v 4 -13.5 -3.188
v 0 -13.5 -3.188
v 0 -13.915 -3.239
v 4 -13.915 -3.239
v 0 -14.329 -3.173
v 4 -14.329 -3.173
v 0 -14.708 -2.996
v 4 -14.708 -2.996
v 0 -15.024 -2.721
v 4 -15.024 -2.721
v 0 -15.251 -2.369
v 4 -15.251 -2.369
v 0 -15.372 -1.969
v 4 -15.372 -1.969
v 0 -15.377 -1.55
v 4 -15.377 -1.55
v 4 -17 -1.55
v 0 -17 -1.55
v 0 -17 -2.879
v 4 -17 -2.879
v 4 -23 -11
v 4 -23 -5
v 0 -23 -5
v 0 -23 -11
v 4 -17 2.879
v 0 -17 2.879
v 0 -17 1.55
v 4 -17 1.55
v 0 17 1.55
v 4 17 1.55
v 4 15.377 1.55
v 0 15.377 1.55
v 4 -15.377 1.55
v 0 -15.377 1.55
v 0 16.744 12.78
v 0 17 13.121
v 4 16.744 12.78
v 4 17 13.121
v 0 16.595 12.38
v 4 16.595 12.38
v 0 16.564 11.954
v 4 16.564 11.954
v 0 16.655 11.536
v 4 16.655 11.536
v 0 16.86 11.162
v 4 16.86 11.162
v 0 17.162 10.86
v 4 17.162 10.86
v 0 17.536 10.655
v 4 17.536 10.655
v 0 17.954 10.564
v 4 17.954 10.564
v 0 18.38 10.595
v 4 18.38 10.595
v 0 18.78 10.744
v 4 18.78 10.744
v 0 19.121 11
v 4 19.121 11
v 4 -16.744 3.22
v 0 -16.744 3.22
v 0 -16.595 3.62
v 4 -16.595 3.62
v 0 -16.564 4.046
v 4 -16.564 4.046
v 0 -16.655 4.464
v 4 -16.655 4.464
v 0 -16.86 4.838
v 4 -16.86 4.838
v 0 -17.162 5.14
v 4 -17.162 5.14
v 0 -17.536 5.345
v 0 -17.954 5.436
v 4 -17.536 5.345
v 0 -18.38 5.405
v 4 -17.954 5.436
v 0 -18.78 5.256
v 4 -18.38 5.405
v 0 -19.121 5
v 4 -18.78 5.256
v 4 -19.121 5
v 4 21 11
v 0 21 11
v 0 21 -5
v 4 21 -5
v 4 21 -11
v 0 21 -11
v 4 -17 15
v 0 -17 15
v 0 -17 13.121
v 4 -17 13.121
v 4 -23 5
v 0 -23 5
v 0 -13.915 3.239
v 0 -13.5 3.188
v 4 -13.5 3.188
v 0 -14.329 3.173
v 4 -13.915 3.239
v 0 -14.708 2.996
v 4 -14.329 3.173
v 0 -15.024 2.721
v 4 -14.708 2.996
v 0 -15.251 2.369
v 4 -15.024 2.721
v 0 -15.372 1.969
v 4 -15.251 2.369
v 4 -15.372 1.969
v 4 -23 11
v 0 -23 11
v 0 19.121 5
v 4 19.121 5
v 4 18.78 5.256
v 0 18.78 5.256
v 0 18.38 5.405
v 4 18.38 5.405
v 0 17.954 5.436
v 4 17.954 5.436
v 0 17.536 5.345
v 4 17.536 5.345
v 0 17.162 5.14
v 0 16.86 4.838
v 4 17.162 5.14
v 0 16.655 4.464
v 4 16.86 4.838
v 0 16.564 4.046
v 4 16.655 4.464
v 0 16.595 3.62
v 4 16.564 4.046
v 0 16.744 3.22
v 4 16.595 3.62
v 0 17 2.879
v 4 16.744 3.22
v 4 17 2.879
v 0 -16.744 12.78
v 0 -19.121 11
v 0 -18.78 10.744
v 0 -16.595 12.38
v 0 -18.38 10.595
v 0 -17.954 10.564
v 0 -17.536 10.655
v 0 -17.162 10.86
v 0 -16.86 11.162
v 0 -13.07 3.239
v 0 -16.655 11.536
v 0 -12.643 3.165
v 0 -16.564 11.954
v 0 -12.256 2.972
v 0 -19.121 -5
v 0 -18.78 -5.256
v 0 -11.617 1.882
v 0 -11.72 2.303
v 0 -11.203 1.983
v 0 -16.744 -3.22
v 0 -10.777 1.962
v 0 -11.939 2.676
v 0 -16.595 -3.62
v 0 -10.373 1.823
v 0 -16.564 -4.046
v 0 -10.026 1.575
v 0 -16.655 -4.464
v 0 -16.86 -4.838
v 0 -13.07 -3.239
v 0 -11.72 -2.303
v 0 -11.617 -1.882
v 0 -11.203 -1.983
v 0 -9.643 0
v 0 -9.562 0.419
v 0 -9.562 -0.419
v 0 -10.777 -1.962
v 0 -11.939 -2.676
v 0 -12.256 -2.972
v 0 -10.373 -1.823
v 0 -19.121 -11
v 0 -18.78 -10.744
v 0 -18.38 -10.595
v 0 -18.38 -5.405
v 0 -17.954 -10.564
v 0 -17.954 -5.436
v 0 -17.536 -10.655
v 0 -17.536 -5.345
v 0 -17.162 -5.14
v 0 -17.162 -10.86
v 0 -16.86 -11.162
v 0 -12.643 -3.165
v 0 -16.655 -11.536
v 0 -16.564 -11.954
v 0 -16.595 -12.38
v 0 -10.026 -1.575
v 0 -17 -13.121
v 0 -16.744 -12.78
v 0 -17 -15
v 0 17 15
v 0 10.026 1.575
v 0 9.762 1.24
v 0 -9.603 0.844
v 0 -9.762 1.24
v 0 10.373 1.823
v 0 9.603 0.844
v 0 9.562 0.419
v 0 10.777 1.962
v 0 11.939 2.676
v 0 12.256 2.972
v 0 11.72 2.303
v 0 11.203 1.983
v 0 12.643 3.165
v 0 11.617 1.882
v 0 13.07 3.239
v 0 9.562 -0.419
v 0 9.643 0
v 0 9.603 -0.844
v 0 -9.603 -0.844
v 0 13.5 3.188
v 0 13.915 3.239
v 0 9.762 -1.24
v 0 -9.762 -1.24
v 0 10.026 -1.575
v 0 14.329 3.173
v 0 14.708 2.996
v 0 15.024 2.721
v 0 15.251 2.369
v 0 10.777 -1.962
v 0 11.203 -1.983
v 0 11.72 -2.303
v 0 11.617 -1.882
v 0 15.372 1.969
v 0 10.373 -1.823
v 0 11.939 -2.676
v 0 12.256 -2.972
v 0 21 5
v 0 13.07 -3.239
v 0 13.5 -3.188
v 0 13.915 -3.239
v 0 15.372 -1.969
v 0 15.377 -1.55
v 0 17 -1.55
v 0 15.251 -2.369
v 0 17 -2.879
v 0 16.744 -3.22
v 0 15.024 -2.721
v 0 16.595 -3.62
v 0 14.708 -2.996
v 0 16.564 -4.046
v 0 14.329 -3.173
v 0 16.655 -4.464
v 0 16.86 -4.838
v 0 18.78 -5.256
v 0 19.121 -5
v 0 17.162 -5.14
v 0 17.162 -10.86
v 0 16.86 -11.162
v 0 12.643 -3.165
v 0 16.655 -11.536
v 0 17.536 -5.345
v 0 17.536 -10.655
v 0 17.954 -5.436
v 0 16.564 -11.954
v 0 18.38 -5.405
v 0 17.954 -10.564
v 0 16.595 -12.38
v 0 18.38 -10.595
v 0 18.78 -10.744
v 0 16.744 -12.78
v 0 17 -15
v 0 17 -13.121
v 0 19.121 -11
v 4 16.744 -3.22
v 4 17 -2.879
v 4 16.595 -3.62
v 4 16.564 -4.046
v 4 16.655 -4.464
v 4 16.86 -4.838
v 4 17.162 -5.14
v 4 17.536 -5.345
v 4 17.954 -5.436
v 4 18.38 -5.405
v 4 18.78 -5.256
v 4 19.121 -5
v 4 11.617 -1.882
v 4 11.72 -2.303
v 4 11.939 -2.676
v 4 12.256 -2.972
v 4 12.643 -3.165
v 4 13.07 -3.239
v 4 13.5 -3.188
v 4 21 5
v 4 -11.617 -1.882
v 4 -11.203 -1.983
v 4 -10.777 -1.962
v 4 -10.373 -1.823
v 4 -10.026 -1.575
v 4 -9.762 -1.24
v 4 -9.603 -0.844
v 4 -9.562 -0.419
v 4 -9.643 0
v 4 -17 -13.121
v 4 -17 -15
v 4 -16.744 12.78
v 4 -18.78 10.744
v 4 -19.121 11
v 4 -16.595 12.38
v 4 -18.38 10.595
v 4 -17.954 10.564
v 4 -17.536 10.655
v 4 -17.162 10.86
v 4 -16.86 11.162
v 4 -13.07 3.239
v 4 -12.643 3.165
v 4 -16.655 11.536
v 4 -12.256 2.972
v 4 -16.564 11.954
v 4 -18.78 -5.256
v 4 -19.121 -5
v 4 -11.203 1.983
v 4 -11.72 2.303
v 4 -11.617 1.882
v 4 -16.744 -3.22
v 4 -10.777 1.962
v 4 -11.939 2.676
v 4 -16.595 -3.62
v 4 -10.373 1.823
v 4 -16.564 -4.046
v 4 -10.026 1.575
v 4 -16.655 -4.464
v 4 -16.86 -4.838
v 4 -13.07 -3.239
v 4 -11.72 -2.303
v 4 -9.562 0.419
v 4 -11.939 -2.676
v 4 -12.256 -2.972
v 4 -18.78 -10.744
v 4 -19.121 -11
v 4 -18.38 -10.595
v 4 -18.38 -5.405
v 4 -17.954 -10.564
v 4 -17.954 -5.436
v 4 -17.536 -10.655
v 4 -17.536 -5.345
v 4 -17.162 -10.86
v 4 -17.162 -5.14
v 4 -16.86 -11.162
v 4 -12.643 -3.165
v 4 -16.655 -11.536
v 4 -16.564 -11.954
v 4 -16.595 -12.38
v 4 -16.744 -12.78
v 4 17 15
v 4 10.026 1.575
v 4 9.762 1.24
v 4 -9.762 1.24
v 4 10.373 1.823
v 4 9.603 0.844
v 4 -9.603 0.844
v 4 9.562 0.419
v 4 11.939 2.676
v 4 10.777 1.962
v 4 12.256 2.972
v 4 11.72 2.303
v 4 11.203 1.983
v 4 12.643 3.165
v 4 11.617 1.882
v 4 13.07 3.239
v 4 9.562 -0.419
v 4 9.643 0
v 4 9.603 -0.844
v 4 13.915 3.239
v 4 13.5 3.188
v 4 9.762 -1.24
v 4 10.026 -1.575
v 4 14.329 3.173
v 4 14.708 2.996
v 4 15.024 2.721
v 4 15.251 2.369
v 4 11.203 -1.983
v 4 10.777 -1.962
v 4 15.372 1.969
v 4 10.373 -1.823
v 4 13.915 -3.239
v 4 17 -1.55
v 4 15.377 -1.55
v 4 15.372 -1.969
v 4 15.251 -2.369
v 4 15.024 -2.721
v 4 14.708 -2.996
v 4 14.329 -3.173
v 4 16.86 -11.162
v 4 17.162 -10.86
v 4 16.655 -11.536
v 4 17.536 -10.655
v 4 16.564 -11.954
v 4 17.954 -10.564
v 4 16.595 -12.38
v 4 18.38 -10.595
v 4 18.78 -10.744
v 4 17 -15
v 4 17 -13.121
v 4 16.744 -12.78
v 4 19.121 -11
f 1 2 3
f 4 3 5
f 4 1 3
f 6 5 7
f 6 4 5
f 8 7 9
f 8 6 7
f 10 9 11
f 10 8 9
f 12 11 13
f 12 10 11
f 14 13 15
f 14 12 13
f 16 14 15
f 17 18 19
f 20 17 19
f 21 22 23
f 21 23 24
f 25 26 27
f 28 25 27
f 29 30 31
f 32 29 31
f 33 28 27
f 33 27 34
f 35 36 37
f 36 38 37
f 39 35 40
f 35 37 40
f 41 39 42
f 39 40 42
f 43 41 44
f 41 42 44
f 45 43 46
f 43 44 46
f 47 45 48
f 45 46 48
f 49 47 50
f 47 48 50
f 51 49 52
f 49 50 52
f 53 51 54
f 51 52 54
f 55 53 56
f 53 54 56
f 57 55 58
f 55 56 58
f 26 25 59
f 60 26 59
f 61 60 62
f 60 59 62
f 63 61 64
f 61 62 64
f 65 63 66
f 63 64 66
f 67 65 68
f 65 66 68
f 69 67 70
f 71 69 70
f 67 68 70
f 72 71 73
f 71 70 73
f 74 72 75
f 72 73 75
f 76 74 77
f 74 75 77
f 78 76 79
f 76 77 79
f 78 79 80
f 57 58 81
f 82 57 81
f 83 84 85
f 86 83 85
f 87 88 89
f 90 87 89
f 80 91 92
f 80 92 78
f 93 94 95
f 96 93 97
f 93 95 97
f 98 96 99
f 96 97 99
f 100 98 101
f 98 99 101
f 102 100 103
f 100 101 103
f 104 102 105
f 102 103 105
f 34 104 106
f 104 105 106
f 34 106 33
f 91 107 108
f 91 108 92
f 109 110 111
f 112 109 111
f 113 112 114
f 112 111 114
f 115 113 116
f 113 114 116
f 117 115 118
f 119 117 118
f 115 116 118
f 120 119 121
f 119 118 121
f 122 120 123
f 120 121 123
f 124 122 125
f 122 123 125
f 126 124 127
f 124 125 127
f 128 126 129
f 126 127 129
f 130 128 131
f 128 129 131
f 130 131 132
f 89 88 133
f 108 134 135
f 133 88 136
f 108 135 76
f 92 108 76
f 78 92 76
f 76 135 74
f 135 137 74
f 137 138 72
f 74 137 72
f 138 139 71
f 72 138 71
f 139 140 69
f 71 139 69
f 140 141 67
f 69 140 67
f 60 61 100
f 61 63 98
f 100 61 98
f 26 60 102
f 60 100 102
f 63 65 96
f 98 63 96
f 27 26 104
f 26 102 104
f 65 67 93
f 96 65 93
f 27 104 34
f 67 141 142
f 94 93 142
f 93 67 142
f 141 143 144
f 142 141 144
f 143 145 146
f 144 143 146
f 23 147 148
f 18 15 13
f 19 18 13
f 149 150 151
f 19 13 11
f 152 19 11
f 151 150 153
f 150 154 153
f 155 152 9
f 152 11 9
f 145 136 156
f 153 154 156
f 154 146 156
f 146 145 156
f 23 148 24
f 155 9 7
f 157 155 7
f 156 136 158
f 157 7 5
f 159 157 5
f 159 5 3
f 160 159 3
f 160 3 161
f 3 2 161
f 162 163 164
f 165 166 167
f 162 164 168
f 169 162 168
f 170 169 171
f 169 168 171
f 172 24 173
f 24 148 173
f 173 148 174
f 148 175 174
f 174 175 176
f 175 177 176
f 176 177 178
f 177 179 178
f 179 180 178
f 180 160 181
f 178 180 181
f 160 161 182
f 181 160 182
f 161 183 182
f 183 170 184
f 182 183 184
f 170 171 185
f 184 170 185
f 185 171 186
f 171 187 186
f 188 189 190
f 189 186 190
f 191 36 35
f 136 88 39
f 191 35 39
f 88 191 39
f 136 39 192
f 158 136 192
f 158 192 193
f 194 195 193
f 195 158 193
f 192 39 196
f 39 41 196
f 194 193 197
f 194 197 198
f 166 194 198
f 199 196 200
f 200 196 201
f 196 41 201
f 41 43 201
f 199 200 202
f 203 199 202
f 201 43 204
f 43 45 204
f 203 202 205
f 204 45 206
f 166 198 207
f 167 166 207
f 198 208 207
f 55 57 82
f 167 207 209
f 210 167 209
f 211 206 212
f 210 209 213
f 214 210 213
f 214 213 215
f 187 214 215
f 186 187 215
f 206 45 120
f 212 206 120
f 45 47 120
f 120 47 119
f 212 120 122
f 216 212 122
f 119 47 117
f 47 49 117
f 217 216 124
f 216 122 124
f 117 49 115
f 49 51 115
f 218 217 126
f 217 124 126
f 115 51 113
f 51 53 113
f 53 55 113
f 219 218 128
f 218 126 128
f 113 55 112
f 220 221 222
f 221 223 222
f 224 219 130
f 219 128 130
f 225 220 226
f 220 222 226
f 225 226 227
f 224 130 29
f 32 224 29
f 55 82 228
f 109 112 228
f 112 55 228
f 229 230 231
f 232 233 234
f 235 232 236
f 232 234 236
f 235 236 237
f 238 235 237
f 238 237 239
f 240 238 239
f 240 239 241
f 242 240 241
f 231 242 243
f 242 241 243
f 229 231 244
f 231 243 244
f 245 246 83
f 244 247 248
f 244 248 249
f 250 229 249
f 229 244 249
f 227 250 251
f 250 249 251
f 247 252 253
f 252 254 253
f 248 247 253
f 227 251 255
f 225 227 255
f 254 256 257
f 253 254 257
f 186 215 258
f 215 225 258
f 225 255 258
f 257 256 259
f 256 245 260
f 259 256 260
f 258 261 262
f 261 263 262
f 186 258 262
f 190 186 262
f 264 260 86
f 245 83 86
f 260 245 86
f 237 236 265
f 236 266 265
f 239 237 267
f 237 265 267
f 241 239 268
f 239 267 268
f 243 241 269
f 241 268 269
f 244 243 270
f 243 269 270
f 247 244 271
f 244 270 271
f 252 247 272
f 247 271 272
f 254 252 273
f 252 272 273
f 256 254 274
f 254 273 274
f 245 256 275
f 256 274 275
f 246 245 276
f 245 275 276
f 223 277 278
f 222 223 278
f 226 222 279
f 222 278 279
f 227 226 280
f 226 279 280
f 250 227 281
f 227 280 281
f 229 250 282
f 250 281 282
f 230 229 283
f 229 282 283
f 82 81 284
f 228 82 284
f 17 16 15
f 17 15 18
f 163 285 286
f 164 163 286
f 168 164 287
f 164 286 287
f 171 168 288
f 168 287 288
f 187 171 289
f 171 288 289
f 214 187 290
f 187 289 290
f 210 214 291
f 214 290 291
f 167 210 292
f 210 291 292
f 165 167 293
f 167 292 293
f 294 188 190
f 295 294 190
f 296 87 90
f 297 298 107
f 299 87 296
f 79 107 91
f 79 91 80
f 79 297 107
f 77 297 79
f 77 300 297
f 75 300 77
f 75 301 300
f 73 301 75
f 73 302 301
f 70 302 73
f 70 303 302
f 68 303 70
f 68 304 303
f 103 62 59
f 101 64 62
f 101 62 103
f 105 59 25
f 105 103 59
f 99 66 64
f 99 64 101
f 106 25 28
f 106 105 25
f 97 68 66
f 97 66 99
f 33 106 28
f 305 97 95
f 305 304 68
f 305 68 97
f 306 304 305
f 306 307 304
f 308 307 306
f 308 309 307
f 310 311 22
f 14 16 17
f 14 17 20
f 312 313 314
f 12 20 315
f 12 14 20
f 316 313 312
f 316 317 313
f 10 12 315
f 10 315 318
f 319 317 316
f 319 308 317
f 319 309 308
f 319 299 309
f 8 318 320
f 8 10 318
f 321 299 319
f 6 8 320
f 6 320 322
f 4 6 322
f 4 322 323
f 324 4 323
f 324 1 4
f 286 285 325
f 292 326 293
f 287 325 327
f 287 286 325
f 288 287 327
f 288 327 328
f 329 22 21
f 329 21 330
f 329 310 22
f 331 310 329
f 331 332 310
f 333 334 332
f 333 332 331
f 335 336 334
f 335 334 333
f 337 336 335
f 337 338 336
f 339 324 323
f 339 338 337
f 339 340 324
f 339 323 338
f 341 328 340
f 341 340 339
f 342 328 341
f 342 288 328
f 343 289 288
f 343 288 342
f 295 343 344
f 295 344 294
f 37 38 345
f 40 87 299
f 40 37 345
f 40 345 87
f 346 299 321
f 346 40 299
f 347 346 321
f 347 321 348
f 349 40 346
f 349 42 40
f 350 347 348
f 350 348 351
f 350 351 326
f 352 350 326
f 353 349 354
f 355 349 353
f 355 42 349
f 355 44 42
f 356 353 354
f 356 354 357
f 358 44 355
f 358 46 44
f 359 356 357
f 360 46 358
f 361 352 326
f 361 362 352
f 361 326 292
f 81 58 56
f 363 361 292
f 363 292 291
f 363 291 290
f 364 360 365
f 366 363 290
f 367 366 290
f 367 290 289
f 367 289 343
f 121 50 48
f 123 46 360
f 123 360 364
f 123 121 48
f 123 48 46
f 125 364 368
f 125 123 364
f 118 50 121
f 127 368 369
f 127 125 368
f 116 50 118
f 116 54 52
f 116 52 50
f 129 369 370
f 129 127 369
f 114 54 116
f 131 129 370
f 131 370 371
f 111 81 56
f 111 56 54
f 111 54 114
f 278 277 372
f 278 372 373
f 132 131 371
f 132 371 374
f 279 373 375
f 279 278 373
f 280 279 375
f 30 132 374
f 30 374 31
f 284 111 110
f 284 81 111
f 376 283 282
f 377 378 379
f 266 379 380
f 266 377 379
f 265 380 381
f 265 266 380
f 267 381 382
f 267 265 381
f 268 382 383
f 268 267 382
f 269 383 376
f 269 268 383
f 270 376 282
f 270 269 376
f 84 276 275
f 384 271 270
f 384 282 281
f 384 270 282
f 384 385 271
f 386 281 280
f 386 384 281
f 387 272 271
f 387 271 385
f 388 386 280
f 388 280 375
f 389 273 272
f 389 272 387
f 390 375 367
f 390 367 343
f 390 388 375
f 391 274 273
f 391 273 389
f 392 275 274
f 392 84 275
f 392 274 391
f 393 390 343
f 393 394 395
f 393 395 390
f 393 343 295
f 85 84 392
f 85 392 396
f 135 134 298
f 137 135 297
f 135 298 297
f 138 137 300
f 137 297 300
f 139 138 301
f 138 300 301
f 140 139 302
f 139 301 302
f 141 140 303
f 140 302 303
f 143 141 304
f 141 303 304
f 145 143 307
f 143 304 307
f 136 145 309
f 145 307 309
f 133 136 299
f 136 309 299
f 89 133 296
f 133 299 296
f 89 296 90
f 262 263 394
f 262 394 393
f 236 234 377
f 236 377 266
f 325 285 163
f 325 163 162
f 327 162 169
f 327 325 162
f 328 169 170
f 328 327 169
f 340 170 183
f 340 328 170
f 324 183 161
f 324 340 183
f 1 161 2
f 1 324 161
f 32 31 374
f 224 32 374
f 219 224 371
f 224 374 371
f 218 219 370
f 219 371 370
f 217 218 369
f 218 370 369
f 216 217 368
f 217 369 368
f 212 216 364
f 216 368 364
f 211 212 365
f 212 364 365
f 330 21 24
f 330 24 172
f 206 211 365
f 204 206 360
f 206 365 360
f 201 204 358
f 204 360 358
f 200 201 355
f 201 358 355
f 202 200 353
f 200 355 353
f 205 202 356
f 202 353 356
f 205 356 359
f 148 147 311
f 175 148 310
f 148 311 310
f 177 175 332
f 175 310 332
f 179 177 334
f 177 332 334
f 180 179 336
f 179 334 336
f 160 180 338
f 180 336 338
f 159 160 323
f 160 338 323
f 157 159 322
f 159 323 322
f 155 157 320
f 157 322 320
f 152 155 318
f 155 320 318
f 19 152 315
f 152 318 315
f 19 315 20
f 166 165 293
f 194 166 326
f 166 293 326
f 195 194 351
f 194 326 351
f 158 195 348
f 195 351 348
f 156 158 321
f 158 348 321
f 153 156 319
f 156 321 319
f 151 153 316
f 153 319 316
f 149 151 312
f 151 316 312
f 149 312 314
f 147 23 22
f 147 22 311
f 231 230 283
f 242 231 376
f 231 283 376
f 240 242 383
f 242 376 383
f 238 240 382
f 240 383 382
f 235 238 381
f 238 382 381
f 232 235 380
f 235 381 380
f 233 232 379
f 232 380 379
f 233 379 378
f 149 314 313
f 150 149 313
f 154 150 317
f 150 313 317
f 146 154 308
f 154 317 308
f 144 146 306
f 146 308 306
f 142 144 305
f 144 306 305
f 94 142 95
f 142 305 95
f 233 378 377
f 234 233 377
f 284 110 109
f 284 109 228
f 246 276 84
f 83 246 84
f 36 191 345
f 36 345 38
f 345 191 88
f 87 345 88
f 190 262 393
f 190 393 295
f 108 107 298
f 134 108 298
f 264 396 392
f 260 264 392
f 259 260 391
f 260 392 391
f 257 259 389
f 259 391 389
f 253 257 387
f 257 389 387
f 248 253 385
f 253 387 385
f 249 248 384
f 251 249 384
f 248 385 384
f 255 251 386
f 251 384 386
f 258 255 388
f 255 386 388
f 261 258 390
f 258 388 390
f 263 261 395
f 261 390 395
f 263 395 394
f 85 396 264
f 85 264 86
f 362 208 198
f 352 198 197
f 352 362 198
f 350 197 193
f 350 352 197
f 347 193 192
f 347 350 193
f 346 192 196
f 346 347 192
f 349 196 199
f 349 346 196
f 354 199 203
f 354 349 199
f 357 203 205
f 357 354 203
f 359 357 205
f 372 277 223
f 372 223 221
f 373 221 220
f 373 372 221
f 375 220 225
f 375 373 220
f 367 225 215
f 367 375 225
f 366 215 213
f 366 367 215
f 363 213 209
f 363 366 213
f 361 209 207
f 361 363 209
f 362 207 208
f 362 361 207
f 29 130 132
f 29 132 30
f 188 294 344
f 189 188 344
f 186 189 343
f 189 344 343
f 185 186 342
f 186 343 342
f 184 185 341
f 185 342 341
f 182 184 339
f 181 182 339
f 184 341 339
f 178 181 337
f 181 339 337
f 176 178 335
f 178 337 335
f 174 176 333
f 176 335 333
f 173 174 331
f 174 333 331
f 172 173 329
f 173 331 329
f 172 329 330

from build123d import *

# Parameters (mm, degrees)
CROQUIS1_W              = 34
CROQUIS1_H              = 30
SALIENTE_EXTRUIR1_DEPTH = 4
CROQUIS2_W              = 6
CROQUIS2_H              = 4
SALIENTE_EXTRUIR2_DEPTH = 4
CORTAR_EXTRUIR1_DEPTH   = 5
CROQUIS4_W              = 6
CROQUIS4_H              = 2
SALIENTE_EXTRUIR3_DEPTH = 4
CROQUIS5_R              = 1.5
CORTAR_EXTRUIR2_DEPTH   = 5
CORTAR_EXTRUIR4_DEPTH   = 5
CORTAR_EXTRUIR6_DEPTH   = 5


with BuildPart() as part:
    # Croquis1 → Saliente-Extruir1 (new body)
    with BuildSketch(Plane(origin=(0, 0, 0), x_dir=(0, -1, 0), z_dir=(1, 0, 0))):
        Rectangle(CROQUIS1_W, CROQUIS1_H)
    extrude(amount=SALIENTE_EXTRUIR1_DEPTH)

    # Croquis2 → Saliente-Extruir2 (add, through all)
    with BuildSketch(Plane(origin=(4, 0, 0), x_dir=(0, 0, -1), z_dir=(1, 0, 0))):
        with Locations((-8, -19)):
            Rectangle(CROQUIS2_W, CROQUIS2_H)
        with Locations((8, -19)):
            Rectangle(CROQUIS2_W, CROQUIS2_H)
        with Locations((8, 19)):
            Rectangle(CROQUIS2_W, CROQUIS2_H)
        with Locations((-8, 19)):
            Rectangle(CROQUIS2_W, CROQUIS2_H)
    extrude(amount=-SALIENTE_EXTRUIR2_DEPTH)

    # Croquis3 → Cortar-Extruir1 (cut, through all)
    with BuildSketch(Plane(origin=(4, 0, 0), x_dir=(0, 0, -1), z_dir=(1, 0, 0))):
        Polygon((-1.55, 17), (-1.55, 14.95), (-2.8, 14.95), (-2.8, 12.05), (-1.55, 12.05), (-1.55, 10), (1.55, 10), (1.55, 12.05), (2.8, 12.05), (2.8, 14.95), (1.55, 14.95), (1.55, 17), align=None)
        Polygon((1.55, -12.05), (2.8, -12.05), (2.8, -14.95), (1.55, -14.95), (1.55, -17), (-1.55, -17), (-1.55, -14.95), (-2.8, -14.95), (-2.8, -12.05), (-1.55, -12.05), (-1.55, -10), (1.55, -10), align=None)
    extrude(amount=-CORTAR_EXTRUIR1_DEPTH, mode=Mode.SUBTRACT)

    # Croquis4 → Saliente-Extruir3 (add, through all)
    with BuildSketch(Plane(origin=(4, 0, 0), x_dir=(0, 0, -1), z_dir=(1, 0, 0))):
        with Locations((-8, -22)):
            Rectangle(CROQUIS4_W, CROQUIS4_H)
        with Locations((8, -22)):
            Rectangle(CROQUIS4_W, CROQUIS4_H)
    extrude(amount=-SALIENTE_EXTRUIR3_DEPTH)

    # Croquis5 → Cortar-Extruir2 (cut, through all)
    with BuildSketch(Plane(origin=(4, 0, 0), x_dir=(0, 0, -1), z_dir=(1, 0, 0))):
        with Locations((-12.060660172, -18.060660172)):
            Circle(CROQUIS5_R)
        with Locations((-3.939339828, -18.060660172)):
            Circle(CROQUIS5_R)
        with Locations((12.060660172, -18.060660172)):
            Circle(CROQUIS5_R)
        with Locations((3.939339828, -18.060660172)):
            Circle(CROQUIS5_R)
        with Locations((-12.060660172, 18.060660172)):
            Circle(CROQUIS5_R)
        with Locations((-3.939339828, 18.060660172)):
            Circle(CROQUIS5_R)
        with Locations((3.939339828, 18.060660172)):
            Circle(CROQUIS5_R)
        with Locations((12.060660172, 18.060660172)):
            Circle(CROQUIS5_R)
    extrude(amount=-CORTAR_EXTRUIR2_DEPTH, mode=Mode.SUBTRACT)

    # Croquis6 → Cortar-Extruir4 (cut, through all)
    with BuildSketch(Plane(origin=(4, 0, 0), x_dir=(0, 0, -1), z_dir=(1, 0, 0))):
        with BuildLine():
            ThreePointArc((0, -9.64272275), (-1.989339828, -11.060660172), (0, -12.478597594))
            ThreePointArc((0, -12.478597594), (1.989339828, -11.060660172), (0, -9.64272275))
        make_face()
        with BuildLine():
            ThreePointArc((0, 9.64272275), (-1.989339828, 11.060660172), (0, 12.478597594))
            ThreePointArc((0, 12.478597594), (1.989339828, 11.060660172), (0, 9.64272275))
        make_face()
    extrude(amount=-CORTAR_EXTRUIR4_DEPTH, mode=Mode.SUBTRACT)

    # Croquis7 → Cortar-Extruir6 (cut, through all)
    with BuildSketch(Plane(origin=(4, 0, 0), x_dir=(0, 0, -1), z_dir=(1, 0, 0))):
        with BuildLine():
            ThreePointArc((-0.290749307, -13.5), (-1.739339828, -11.610660172), (-3.187930349, -13.5))
            ThreePointArc((-3.187930349, -13.5), (-1.739339828, -15.389339828), (-0.290749307, -13.5))
        make_face()
        with BuildLine():
            ThreePointArc((0.290749307, -13.5), (1.739339828, -11.610660172), (3.187930349, -13.5))
            ThreePointArc((3.187930349, -13.5), (1.739339828, -15.389339828), (0.290749307, -13.5))
        make_face()
        with BuildLine():
            ThreePointArc((0.290749307, 13.5), (1.739339828, 11.610660172), (3.187930349, 13.5))
            ThreePointArc((3.187930349, 13.5), (1.739339828, 15.389339828), (0.290749307, 13.5))
        make_face()
        with BuildLine():
            ThreePointArc((-0.290749307, 13.5), (-1.739339828, 15.389339828), (-3.187930349, 13.5))
            ThreePointArc((-3.187930349, 13.5), (-1.739339828, 11.610660172), (-0.290749307, 13.5))
        make_face()
    extrude(amount=-CORTAR_EXTRUIR6_DEPTH, mode=Mode.SUBTRACT)


solid = part.part
